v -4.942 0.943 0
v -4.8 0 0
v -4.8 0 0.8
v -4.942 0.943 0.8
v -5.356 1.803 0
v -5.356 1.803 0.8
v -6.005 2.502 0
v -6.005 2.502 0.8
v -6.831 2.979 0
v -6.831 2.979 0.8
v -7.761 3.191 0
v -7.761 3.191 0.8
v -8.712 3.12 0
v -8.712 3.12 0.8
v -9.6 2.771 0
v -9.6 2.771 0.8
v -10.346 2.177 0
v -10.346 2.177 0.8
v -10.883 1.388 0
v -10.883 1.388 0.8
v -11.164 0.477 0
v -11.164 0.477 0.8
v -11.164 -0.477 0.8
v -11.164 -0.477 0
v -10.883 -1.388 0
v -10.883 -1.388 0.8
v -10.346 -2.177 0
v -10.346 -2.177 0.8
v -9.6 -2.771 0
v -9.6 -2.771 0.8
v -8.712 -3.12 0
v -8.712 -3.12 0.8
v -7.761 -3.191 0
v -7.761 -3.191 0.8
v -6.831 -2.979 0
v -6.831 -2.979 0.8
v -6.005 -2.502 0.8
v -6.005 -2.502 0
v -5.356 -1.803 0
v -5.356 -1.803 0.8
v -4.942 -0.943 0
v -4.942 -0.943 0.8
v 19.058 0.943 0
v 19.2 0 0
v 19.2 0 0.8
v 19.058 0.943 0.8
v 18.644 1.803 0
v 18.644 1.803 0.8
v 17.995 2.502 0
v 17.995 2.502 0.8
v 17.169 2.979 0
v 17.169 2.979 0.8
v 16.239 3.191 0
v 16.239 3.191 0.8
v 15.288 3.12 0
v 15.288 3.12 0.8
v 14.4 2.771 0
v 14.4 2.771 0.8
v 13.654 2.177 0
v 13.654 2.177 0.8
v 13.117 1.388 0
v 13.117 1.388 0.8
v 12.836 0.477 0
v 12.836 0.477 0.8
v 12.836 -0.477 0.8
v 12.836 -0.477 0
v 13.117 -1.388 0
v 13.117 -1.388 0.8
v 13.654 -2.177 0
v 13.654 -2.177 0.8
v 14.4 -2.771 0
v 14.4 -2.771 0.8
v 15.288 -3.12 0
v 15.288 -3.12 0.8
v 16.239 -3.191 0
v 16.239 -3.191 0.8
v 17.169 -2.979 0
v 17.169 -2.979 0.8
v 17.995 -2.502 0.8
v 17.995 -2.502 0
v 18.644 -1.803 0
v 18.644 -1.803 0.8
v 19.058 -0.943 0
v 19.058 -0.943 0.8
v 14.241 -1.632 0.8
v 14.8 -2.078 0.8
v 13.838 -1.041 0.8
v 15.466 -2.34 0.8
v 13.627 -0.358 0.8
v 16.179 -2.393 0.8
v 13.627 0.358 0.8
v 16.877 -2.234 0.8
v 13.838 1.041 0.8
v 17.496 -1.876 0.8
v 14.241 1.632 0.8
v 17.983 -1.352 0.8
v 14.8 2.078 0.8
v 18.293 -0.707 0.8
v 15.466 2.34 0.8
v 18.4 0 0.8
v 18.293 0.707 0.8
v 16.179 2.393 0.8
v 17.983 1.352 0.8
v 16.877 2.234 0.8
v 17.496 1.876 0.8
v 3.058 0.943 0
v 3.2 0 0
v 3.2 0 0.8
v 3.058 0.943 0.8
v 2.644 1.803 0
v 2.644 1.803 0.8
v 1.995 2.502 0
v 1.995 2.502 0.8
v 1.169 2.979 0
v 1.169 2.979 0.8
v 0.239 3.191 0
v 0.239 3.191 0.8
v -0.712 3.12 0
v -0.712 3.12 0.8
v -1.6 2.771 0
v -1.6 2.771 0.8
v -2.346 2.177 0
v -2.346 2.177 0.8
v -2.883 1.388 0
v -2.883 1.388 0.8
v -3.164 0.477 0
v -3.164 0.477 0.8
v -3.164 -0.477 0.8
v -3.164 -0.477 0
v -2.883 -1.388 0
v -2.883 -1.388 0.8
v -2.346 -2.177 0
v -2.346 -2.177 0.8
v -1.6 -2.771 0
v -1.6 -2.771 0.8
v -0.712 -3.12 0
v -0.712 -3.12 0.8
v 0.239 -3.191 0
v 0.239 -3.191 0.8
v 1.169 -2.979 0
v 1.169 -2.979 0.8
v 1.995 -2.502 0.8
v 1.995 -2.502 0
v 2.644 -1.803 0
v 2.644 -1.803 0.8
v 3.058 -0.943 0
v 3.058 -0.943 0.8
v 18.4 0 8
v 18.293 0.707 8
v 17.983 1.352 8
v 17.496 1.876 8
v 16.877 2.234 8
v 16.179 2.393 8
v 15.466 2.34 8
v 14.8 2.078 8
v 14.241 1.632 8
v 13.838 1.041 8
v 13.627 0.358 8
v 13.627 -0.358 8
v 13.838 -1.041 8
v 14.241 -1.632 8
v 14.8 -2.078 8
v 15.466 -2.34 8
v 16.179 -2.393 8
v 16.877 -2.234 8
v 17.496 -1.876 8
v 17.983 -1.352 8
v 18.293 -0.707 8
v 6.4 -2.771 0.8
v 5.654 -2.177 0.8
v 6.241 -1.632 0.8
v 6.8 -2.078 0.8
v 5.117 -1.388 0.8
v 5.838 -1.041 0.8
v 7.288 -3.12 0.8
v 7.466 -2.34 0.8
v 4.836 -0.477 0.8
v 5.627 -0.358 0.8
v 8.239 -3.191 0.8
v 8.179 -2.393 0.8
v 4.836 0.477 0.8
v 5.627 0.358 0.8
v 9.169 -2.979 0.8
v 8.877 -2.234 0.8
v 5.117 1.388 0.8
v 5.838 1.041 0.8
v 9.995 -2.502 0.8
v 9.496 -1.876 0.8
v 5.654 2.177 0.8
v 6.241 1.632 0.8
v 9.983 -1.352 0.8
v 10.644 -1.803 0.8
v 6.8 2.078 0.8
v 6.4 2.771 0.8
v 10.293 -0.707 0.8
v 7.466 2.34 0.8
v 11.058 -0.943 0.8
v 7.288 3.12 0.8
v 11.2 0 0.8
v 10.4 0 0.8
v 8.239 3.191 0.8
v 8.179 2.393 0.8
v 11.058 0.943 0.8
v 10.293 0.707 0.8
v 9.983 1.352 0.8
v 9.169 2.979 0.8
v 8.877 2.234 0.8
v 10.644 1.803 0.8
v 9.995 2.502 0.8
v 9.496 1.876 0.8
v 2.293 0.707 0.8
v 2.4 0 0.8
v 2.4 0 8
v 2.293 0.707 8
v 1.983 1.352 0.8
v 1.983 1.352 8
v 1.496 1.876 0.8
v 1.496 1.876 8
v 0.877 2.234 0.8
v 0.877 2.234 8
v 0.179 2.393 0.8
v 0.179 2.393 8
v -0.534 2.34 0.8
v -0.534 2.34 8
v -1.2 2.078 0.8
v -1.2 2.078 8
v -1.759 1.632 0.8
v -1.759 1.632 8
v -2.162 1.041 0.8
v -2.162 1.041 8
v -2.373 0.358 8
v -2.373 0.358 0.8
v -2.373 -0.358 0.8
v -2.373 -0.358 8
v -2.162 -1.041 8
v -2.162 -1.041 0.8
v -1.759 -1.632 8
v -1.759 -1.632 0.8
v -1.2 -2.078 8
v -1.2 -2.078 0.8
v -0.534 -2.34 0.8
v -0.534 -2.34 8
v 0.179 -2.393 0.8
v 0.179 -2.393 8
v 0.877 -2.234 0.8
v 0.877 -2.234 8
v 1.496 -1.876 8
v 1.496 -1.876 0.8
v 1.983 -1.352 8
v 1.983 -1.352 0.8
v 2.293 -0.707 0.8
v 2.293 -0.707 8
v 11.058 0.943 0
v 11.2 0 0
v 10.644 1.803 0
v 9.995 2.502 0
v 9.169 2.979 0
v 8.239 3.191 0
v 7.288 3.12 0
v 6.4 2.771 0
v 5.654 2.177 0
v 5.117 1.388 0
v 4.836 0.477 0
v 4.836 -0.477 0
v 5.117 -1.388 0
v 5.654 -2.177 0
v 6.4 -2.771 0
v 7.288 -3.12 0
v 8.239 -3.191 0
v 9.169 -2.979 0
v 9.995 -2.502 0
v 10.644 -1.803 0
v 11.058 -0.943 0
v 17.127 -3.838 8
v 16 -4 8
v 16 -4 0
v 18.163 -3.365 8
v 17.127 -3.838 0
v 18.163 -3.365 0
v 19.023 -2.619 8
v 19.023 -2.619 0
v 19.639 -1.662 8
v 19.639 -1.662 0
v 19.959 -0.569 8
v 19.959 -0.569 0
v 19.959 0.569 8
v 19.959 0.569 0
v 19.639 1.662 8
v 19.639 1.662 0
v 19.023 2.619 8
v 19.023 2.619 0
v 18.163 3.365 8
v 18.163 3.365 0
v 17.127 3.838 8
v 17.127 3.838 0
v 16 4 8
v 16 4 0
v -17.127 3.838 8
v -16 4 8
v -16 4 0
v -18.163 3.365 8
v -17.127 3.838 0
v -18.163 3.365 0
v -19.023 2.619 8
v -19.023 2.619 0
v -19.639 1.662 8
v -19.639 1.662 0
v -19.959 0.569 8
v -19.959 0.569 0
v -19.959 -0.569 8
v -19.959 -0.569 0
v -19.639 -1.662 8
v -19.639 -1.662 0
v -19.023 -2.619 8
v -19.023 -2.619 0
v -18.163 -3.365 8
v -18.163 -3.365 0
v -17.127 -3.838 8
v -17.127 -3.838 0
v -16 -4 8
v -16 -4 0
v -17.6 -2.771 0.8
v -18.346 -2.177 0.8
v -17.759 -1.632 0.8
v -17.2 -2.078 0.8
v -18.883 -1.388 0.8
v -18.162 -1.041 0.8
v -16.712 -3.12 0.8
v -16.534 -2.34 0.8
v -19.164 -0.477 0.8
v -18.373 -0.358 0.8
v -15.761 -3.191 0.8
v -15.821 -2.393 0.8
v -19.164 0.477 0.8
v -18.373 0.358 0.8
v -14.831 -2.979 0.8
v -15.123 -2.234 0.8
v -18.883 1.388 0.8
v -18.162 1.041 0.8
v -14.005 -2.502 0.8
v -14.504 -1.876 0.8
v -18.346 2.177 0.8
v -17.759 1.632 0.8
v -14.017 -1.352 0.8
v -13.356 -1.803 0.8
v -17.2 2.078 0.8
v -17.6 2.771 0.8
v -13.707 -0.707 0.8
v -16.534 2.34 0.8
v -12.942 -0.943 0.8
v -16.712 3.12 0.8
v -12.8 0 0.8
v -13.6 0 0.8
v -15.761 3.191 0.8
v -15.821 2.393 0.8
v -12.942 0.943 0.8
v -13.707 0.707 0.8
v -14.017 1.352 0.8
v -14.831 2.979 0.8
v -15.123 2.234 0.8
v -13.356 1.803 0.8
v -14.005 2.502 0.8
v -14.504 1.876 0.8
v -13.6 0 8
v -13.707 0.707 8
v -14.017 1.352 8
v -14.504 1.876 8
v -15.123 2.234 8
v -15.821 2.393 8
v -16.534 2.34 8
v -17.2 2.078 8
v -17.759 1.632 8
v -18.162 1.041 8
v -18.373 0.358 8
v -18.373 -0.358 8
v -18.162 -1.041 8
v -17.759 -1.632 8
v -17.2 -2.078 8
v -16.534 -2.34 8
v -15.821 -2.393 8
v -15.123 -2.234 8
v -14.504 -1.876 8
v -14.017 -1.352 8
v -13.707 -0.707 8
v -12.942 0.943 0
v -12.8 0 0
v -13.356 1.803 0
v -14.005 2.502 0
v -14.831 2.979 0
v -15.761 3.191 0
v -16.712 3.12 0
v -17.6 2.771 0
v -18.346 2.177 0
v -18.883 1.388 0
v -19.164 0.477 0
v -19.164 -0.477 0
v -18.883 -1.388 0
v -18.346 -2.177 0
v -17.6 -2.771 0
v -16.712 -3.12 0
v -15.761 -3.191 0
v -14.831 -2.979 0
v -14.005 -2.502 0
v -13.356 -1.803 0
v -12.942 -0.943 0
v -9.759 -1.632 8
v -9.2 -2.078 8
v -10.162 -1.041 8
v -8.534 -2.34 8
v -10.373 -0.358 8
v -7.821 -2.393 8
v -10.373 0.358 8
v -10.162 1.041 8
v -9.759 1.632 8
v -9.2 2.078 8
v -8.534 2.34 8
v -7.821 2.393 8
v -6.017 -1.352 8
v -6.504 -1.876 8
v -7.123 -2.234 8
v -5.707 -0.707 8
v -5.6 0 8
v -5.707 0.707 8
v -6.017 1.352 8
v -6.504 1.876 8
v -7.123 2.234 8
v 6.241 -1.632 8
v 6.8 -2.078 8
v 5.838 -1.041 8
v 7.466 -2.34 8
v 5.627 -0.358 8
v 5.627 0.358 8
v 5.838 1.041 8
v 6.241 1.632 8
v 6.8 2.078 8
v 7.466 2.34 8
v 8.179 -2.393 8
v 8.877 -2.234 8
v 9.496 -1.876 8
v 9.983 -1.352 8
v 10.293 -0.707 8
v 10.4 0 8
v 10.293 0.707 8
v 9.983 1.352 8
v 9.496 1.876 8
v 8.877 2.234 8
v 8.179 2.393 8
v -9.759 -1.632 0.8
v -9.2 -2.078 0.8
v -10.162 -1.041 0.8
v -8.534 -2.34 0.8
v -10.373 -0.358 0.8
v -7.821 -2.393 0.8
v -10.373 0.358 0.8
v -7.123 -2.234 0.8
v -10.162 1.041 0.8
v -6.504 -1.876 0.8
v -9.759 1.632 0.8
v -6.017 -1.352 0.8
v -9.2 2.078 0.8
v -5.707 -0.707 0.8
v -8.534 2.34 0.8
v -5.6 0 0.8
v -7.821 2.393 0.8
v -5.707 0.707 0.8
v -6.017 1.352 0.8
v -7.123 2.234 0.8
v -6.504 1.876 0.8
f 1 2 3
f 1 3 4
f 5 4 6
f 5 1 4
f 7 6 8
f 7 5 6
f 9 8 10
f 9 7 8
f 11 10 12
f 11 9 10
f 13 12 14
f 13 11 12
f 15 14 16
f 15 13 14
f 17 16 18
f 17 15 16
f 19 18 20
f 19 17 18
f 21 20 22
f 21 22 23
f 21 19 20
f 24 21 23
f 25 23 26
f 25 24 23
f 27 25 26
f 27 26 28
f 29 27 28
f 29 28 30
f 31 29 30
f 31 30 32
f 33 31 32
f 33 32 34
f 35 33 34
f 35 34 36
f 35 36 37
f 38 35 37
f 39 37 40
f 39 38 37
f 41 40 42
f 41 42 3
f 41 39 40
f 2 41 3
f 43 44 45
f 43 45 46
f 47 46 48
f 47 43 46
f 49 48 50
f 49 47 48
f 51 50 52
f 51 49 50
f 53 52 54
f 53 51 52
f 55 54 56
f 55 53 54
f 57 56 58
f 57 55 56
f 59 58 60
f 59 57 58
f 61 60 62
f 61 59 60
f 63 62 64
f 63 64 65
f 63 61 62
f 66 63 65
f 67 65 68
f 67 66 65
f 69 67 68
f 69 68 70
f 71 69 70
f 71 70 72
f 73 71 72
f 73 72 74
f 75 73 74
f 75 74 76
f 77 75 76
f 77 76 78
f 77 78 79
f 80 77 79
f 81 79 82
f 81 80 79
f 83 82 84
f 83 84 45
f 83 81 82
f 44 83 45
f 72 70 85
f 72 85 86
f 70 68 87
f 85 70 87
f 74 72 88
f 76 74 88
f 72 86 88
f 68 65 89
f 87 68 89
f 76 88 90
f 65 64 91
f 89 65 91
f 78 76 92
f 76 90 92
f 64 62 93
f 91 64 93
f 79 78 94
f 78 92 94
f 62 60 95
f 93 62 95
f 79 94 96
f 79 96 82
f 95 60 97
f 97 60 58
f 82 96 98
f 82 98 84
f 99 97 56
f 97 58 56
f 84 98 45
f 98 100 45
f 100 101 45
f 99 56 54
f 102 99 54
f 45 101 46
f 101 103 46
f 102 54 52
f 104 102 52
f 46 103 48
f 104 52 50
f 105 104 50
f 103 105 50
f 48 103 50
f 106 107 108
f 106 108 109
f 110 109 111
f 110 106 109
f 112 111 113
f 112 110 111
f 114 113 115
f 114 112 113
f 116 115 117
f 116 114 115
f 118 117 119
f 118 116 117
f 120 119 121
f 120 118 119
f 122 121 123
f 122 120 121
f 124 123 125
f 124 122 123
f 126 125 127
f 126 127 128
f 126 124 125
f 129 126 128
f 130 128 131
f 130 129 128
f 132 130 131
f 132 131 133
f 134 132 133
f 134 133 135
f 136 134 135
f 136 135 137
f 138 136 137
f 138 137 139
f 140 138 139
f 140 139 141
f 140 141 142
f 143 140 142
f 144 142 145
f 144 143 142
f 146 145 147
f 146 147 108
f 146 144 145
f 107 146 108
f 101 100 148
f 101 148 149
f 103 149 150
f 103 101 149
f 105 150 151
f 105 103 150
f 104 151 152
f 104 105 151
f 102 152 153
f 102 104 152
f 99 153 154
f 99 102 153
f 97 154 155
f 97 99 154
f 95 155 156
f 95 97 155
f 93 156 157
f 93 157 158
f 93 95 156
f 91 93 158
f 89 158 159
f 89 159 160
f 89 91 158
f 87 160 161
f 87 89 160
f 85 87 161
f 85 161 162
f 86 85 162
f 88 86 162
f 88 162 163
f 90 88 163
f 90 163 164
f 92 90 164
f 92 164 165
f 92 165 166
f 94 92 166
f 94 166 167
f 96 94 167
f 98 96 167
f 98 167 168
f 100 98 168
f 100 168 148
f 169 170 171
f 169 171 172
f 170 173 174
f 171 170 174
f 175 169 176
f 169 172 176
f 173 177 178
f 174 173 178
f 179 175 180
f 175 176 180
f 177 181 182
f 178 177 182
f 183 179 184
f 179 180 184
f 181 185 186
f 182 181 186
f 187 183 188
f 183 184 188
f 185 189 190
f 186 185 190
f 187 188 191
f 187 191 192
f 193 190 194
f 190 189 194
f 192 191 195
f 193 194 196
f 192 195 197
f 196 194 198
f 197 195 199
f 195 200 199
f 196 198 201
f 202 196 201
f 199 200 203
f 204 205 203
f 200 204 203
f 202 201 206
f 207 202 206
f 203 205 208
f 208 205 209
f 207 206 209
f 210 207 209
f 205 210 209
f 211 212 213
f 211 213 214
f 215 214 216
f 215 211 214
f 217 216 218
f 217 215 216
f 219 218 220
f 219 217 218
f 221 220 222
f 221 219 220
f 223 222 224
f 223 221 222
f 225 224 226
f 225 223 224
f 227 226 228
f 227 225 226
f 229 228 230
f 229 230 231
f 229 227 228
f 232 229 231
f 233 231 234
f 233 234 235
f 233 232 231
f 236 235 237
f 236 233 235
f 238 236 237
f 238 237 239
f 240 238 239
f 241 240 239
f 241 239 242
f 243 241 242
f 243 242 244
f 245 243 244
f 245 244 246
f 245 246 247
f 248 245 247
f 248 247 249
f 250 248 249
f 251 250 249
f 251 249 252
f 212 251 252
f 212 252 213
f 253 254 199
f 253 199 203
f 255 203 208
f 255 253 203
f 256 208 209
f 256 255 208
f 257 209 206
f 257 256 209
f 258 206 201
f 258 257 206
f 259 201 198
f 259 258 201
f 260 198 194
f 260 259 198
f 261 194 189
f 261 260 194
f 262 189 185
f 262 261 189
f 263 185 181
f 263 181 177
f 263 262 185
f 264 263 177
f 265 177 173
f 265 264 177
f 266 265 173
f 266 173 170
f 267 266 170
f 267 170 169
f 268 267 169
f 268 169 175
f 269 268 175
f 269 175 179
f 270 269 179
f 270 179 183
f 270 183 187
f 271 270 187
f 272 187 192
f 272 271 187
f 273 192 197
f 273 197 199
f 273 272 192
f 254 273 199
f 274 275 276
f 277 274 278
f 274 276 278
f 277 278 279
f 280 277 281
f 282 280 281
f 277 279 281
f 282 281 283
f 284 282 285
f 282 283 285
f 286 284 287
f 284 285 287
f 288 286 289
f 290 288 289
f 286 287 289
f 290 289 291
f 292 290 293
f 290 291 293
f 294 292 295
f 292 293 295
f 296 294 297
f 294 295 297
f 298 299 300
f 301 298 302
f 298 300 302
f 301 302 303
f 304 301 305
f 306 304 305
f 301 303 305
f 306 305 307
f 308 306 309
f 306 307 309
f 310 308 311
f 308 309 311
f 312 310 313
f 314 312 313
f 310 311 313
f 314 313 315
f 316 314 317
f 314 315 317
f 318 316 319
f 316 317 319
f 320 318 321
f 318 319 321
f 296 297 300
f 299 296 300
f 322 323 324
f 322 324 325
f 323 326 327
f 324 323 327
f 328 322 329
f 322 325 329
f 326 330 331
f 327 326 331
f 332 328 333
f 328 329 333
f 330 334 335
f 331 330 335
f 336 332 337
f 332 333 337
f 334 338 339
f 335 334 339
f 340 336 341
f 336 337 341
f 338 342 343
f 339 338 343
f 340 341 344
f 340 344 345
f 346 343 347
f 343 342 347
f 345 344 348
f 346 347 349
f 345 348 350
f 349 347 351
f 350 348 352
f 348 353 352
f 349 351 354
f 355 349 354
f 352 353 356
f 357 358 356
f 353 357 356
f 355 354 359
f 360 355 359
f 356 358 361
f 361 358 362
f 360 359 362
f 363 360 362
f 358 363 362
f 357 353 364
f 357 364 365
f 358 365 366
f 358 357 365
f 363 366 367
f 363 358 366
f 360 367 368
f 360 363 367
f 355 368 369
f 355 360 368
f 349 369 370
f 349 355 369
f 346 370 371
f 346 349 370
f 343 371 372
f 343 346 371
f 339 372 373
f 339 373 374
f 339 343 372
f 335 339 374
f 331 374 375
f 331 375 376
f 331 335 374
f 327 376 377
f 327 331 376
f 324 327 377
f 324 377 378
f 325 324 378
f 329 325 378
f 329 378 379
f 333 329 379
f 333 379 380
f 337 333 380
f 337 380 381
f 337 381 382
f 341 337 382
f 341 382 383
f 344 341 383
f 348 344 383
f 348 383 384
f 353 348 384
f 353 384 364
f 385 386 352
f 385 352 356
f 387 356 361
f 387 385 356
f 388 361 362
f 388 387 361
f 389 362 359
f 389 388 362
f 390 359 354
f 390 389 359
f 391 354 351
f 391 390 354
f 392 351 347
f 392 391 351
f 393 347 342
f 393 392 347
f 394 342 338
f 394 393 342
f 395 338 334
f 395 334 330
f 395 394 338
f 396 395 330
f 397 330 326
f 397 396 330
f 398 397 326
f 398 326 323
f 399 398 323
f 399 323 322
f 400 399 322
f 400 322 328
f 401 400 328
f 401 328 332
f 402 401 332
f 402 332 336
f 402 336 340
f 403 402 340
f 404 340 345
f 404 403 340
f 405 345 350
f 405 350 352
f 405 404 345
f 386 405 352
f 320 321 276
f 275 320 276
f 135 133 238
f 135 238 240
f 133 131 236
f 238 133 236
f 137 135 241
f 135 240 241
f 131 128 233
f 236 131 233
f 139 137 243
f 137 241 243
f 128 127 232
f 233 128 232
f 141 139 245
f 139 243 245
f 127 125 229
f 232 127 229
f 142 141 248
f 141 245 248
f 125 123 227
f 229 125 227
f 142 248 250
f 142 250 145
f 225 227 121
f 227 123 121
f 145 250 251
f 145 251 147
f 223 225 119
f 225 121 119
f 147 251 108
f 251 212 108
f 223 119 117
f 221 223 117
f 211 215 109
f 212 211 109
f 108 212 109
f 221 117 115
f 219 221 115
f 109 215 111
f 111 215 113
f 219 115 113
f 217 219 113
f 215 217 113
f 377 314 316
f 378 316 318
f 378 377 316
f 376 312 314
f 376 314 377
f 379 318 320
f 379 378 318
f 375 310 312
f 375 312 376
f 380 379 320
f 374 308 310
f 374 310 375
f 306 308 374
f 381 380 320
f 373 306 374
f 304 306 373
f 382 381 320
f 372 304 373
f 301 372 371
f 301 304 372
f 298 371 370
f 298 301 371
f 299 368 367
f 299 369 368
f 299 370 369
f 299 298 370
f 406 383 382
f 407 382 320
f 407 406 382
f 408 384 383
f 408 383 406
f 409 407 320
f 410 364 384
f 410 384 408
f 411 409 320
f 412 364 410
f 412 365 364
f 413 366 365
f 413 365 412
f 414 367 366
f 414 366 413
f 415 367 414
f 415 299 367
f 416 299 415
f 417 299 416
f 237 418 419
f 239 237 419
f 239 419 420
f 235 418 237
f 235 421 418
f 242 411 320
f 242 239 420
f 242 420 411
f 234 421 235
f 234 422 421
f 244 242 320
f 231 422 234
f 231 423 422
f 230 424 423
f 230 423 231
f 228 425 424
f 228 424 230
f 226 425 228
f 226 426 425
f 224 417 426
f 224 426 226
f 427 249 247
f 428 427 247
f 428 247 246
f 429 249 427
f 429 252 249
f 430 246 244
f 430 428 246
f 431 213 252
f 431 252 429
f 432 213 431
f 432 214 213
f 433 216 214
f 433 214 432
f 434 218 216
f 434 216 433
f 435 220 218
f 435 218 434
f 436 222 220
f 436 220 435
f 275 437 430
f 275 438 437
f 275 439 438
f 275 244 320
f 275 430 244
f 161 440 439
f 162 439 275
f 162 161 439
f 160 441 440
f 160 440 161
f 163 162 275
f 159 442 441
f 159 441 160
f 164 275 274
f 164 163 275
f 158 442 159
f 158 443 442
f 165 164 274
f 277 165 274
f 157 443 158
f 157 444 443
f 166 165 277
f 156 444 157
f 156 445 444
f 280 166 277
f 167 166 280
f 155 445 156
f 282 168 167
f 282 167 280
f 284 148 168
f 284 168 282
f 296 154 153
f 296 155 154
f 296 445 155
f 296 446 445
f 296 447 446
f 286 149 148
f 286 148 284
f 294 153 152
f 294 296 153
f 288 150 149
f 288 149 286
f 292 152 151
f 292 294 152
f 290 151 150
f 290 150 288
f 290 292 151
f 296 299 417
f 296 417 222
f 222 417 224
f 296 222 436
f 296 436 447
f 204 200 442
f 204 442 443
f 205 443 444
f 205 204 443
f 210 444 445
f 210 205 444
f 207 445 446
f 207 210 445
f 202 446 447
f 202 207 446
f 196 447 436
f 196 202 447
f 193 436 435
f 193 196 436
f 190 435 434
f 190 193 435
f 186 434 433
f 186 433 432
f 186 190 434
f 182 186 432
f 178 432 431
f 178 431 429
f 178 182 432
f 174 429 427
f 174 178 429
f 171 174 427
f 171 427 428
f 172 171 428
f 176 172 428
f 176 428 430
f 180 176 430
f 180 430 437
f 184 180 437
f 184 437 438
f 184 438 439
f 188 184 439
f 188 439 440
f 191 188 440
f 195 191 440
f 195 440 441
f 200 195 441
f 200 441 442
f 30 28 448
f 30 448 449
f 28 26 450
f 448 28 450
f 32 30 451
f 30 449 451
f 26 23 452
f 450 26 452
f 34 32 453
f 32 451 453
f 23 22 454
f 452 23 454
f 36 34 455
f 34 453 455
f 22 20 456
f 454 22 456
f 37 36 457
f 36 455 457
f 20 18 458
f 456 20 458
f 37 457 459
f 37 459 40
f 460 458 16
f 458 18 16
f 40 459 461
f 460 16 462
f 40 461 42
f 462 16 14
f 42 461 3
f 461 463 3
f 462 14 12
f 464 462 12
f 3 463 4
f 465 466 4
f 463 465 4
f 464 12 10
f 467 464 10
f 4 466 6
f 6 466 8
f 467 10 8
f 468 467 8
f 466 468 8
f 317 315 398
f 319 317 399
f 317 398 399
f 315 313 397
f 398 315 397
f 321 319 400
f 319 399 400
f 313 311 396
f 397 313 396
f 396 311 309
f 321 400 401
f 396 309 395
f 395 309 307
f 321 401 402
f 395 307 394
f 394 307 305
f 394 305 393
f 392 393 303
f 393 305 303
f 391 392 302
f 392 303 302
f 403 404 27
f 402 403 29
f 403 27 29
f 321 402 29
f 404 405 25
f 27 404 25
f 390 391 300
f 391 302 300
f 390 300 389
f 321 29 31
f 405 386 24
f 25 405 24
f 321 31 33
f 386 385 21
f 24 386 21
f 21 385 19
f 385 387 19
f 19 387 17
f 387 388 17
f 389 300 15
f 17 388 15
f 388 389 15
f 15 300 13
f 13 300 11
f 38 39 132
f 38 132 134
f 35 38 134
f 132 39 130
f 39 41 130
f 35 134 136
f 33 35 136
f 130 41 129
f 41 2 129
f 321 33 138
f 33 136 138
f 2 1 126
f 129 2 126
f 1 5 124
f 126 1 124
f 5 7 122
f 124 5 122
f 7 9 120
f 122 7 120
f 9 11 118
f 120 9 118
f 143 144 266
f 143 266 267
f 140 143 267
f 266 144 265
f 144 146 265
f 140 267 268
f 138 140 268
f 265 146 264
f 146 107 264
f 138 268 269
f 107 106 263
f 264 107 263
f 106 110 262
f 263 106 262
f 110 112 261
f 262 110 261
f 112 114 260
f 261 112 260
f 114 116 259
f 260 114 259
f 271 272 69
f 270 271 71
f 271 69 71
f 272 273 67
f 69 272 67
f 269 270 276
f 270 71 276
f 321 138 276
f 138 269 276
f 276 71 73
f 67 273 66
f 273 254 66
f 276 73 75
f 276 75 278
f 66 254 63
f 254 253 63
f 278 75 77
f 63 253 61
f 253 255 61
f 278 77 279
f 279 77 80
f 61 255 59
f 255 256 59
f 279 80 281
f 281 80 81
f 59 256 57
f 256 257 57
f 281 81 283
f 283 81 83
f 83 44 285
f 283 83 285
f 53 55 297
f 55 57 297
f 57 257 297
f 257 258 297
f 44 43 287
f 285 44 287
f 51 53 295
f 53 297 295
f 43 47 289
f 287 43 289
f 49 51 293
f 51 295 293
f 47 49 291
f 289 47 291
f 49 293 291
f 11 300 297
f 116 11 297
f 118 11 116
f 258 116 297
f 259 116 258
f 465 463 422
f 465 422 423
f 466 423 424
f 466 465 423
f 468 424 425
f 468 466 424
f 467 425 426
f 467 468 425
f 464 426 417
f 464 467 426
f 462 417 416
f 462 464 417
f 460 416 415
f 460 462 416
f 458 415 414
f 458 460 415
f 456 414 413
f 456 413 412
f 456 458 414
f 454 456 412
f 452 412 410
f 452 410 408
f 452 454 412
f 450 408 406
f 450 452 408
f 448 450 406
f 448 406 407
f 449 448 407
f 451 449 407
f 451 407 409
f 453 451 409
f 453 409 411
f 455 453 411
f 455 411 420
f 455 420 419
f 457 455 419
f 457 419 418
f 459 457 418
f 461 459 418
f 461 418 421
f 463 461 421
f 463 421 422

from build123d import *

# Parameters (mm, degrees)
SKETCH_R     = 2.4
PAD_DEPTH    = 8
SKETCH001_R  = 3.2
POCKET_DEPTH = 0.8


with BuildPart() as part:
    # Sketch → Pad (new body)
    with BuildSketch(Plane.XY):
        with BuildLine():
            ThreePointArc((-16, 4), (-20, 0), (-16, -4))
            Line((-16, -4), (16, -4))
            ThreePointArc((16, -4), (20, 0), (16, 4))
            Line((16, 4), (-16, 4))
        make_face()
        with Locations((-16, 0)):
            Circle(SKETCH_R, mode=Mode.SUBTRACT)
        with Locations((16, 0)):
            Circle(SKETCH_R, mode=Mode.SUBTRACT)
        with Locations((8, 0)):
            Circle(SKETCH_R, mode=Mode.SUBTRACT)
        with Locations((-8, 0)):
            Circle(SKETCH_R, mode=Mode.SUBTRACT)
        Circle(SKETCH_R, mode=Mode.SUBTRACT)
    extrude(amount=PAD_DEPTH)

    # Sketch001 → Pocket (cut)
    with BuildSketch(Plane.XY):
        Circle(SKETCH001_R)
        with Locations((-16, 0)):
            Circle(SKETCH001_R)
        with Locations((-8, 0)):
            Circle(SKETCH001_R)
        with Locations((8, 0)):
            Circle(SKETCH001_R)
        with Locations((16, 0)):
            Circle(SKETCH001_R)
    extrude(amount=POCKET_DEPTH, mode=Mode.SUBTRACT)


solid = part.part
